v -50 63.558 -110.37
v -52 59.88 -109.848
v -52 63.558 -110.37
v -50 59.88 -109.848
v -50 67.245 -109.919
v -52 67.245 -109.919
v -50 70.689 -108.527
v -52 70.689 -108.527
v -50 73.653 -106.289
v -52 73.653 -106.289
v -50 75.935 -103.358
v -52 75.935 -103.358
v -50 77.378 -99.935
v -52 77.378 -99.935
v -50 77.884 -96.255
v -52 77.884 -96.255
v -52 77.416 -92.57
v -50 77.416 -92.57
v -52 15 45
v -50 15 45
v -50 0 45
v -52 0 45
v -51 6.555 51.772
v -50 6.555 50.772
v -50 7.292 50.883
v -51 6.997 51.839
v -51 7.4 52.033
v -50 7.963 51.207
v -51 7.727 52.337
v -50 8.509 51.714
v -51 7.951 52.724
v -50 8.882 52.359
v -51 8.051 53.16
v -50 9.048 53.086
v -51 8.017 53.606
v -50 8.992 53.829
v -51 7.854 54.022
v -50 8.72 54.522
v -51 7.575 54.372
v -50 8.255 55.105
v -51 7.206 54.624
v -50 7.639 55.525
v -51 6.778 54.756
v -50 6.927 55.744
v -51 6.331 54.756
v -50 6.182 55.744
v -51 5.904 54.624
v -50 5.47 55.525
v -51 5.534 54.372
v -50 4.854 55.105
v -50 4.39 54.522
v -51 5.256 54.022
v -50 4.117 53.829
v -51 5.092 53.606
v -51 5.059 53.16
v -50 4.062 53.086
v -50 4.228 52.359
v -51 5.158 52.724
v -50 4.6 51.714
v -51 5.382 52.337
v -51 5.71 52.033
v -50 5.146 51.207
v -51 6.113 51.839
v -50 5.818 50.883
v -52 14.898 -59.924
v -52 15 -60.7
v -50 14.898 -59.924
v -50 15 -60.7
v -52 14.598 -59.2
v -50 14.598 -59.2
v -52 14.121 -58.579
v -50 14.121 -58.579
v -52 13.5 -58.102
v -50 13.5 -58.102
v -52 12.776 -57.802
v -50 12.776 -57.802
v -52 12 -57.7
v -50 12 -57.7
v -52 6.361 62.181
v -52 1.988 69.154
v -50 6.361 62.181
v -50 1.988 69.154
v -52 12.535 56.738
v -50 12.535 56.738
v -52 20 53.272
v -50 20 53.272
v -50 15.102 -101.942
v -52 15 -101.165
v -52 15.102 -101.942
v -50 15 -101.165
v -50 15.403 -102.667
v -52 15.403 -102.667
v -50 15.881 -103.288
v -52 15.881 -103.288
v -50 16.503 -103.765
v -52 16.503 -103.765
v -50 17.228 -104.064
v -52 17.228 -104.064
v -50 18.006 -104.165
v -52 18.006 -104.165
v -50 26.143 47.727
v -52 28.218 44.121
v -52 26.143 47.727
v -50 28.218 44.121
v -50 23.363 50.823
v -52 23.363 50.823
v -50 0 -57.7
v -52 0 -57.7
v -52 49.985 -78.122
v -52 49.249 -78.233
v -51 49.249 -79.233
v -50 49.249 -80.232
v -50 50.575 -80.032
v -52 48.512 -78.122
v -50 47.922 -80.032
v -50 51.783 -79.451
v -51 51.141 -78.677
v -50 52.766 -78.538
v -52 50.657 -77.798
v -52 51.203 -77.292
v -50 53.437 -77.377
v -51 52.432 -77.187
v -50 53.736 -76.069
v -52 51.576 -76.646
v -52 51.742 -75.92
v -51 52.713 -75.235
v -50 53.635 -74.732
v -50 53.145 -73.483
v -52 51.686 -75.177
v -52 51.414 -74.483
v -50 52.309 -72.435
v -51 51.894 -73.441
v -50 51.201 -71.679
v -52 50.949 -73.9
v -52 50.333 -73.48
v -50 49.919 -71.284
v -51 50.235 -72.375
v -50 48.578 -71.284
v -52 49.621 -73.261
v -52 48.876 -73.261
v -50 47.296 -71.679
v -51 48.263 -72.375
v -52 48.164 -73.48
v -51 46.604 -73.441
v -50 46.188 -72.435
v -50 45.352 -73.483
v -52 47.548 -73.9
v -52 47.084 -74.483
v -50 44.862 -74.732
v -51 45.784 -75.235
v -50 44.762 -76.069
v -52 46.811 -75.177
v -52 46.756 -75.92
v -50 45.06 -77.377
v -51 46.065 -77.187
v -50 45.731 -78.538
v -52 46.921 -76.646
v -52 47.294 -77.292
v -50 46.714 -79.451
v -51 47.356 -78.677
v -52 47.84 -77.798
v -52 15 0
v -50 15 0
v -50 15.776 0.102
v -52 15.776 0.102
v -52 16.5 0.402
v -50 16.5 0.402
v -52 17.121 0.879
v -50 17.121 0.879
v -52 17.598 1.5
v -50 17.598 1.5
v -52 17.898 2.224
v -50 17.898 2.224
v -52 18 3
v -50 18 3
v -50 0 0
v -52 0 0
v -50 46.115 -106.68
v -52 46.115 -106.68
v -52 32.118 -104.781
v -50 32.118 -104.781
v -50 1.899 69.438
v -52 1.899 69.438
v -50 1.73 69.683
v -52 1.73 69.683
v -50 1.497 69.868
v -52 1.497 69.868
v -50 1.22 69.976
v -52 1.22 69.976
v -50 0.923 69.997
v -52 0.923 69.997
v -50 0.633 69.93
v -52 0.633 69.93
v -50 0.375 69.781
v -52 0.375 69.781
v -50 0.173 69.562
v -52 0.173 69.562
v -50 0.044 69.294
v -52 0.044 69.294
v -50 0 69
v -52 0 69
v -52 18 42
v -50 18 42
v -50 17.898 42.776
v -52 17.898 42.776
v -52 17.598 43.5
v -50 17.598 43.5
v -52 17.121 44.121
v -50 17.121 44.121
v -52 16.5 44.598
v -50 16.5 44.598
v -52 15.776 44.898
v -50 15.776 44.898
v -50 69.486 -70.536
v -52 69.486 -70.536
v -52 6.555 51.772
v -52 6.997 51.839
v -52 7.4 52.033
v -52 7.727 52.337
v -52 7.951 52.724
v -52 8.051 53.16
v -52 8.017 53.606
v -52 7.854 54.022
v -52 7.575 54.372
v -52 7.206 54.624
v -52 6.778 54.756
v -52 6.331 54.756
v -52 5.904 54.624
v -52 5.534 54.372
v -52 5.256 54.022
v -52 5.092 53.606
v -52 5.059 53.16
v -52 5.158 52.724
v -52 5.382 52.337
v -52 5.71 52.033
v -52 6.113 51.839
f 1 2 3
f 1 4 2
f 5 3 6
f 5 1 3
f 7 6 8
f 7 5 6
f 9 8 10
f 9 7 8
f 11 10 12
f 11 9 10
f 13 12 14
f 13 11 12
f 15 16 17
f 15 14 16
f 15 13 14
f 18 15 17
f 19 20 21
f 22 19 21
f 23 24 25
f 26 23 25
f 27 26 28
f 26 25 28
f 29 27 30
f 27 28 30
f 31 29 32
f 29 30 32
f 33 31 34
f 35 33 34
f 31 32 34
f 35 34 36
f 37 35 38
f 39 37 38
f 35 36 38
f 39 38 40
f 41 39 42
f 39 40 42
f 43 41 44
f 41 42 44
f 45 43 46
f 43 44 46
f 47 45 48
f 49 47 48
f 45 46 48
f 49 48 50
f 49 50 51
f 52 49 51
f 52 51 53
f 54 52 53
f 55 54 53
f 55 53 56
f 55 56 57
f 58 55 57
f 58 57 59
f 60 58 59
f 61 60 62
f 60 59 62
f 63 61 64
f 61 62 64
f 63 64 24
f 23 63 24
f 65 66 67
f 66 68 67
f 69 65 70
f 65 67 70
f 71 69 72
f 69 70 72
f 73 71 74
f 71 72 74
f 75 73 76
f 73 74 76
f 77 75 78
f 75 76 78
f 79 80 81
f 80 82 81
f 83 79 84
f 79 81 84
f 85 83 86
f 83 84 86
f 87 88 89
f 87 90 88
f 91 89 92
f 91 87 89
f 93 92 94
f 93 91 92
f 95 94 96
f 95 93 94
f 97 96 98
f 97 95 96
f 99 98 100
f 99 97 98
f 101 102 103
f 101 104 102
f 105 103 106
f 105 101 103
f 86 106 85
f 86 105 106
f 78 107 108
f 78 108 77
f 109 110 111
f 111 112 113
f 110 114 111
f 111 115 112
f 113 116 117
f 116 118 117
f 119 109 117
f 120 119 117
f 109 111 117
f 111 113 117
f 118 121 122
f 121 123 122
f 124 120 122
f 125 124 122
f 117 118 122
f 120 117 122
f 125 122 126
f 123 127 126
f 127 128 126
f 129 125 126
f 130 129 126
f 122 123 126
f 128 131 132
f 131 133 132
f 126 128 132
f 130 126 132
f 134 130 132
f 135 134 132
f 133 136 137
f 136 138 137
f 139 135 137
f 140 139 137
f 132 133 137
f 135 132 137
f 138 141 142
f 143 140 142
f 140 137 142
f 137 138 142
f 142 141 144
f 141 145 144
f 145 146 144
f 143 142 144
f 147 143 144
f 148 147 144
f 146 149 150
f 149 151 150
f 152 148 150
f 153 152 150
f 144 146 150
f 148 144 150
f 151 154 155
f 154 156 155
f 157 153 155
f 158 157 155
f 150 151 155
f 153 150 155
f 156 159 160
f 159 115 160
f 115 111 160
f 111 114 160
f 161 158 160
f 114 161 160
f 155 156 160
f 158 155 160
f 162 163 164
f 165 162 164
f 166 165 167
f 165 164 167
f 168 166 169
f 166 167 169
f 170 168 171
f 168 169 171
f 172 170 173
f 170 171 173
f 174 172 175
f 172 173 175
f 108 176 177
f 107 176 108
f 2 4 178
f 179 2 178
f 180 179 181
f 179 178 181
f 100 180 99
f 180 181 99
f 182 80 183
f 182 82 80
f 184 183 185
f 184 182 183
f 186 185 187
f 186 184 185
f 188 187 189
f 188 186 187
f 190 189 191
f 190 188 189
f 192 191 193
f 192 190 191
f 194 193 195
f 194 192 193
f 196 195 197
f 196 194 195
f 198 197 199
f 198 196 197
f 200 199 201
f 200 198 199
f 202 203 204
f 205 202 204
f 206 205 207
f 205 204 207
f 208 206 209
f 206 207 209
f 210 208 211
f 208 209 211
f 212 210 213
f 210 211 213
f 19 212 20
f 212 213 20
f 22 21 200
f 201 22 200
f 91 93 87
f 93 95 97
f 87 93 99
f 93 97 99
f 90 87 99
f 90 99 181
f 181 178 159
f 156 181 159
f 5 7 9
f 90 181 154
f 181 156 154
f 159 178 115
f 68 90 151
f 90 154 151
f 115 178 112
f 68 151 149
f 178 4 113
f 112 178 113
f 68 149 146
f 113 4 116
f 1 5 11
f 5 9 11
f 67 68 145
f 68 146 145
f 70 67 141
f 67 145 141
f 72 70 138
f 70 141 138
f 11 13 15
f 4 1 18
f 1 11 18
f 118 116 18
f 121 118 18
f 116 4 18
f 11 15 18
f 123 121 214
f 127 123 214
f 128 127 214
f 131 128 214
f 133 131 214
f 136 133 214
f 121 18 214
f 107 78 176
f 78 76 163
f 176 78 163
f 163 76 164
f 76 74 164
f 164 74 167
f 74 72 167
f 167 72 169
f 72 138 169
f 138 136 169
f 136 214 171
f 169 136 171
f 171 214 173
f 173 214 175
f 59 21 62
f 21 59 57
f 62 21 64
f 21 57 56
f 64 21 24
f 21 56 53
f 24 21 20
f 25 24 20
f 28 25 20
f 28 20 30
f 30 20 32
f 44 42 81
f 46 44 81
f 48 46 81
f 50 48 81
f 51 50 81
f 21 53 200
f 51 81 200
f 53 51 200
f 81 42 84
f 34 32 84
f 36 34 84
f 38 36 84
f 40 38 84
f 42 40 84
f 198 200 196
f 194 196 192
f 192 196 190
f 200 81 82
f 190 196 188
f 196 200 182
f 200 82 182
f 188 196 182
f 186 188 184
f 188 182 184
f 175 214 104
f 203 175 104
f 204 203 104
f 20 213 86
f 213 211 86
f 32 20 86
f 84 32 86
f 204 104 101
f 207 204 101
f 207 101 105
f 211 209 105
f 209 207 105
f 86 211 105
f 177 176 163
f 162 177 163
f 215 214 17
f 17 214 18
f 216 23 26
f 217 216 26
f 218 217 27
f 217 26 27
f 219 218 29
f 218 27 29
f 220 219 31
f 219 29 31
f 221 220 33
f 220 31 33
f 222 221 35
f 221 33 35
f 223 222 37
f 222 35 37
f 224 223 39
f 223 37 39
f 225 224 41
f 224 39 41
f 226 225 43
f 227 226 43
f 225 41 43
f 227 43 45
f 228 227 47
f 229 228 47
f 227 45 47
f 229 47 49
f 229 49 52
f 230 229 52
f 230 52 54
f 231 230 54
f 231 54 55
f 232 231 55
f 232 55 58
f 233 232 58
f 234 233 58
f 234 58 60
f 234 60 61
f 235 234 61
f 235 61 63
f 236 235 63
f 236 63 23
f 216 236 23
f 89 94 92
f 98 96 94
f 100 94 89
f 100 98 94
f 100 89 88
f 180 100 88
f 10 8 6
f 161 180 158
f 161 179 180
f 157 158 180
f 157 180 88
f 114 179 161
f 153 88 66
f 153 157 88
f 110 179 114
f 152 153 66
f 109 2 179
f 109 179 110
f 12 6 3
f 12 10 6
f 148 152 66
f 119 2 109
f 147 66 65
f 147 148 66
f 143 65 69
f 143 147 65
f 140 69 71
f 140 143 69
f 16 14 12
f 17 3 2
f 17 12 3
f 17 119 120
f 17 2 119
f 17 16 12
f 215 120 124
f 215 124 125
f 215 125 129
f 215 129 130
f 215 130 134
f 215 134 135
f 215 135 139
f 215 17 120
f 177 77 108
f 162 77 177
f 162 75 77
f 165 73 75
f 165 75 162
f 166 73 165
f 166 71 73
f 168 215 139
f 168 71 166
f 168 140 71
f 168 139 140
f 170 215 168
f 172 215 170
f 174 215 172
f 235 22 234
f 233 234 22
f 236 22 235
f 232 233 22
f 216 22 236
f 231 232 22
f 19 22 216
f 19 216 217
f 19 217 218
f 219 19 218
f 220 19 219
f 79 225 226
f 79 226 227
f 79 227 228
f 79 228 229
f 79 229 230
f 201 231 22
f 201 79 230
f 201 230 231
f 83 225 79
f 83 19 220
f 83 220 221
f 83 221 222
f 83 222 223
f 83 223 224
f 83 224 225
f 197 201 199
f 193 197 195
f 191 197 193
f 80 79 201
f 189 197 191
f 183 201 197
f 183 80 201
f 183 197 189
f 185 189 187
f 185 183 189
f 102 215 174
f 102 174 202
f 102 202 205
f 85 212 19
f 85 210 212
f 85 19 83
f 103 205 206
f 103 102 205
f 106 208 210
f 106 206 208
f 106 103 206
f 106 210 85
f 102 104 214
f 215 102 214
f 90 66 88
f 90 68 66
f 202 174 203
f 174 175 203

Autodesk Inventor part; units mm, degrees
ref_plane "YZ Plane" through (0, 0, 0) normal (1, 0, 0) x (0, 1, 0)
ref_plane "XZ Plane" through (0, 0, 0) normal (0, 1, 0) x (-1, 0, 0)
ref_plane "Work Plane3" through (-50, 0, 0) normal (-1, 0, 0) x (0, 0, 1)
sketch "Sketch6" plane through (-50, 0, 0) normal (-1, 0, 0) x (0, 0, 1)
  arc A0 (-92.5702, 77.4165) -> (-109.8479, 59.8803) centre (-96.1815, 63.695) ccw
  line L0 (-70.536, 69.486) -> (-92.5702, 77.4165)
  line L1 (44.1213, 28.2183) -> (-70.536, 69.486)
  arc A1 (53.2724, 20) -> (44.1213, 28.2183) centre (36.052, 10.0292) ccw
  arc A2 (53.2724, 20) -> (69.1541, 1.9881) centre (80.7478, 28.2183) ccw
  arc A3 (69, 0) -> (69.1541, 1.9881) centre (69, 1) ccw
  line L2 (45, 0) -> (69, 0)
  line L3 (45, 15) -> (45, 0)
  arc A4 (45, 15) -> (42, 18) centre (42, 15) ccw
  line L4 (3, 18) -> (42, 18)
  arc A5 (3, 18) -> (0, 15) centre (3, 15) ccw
  line L5 (0, 0) -> (0, 15)
  line L6 (0, 0) -> (-57.7, 0)
  line L7 (-57.7, 0) -> (-57.7, 12)
  arc A6 (-57.7, 12) -> (-60.7, 15) centre (-60.7, 12) ccw
  line L8 (-60.7, 15) -> (-101.1648, 15)
  arc A7 (-104.1648, 18.006) -> (-101.1648, 15) centre (-101.1648, 18) ccw
  arc A8 (-104.1648, 18.006) -> (-109.8479, 59.8803) centre (-258.9764, 18.3179) ccw
extrude "Extrusion2" add sketch "Sketch6" along normal blind 2
sketch "Sketch7" plane through (-50, 0, 0) normal (1, 0, 0) x (0, 0, -1)
  circle A0 centre (75.7329, 49.2486) radius 2.5
  circle A1 centre (-53.2724, 6.5547) radius 1.5
  point P0 (0, 0)
extrude "Extrusion3" cut sketch "Sketch7" against normal blind 10
chamfer "Chamfer1" distance 2 angle 45 1 edges at (-50, 49.2486, -73.2329)
chamfer "Chamfer2" distance 1 angle 45 1 edges at (-50, 6.5547, 54.7724)
properties part number "tampa frontal - corpo"
